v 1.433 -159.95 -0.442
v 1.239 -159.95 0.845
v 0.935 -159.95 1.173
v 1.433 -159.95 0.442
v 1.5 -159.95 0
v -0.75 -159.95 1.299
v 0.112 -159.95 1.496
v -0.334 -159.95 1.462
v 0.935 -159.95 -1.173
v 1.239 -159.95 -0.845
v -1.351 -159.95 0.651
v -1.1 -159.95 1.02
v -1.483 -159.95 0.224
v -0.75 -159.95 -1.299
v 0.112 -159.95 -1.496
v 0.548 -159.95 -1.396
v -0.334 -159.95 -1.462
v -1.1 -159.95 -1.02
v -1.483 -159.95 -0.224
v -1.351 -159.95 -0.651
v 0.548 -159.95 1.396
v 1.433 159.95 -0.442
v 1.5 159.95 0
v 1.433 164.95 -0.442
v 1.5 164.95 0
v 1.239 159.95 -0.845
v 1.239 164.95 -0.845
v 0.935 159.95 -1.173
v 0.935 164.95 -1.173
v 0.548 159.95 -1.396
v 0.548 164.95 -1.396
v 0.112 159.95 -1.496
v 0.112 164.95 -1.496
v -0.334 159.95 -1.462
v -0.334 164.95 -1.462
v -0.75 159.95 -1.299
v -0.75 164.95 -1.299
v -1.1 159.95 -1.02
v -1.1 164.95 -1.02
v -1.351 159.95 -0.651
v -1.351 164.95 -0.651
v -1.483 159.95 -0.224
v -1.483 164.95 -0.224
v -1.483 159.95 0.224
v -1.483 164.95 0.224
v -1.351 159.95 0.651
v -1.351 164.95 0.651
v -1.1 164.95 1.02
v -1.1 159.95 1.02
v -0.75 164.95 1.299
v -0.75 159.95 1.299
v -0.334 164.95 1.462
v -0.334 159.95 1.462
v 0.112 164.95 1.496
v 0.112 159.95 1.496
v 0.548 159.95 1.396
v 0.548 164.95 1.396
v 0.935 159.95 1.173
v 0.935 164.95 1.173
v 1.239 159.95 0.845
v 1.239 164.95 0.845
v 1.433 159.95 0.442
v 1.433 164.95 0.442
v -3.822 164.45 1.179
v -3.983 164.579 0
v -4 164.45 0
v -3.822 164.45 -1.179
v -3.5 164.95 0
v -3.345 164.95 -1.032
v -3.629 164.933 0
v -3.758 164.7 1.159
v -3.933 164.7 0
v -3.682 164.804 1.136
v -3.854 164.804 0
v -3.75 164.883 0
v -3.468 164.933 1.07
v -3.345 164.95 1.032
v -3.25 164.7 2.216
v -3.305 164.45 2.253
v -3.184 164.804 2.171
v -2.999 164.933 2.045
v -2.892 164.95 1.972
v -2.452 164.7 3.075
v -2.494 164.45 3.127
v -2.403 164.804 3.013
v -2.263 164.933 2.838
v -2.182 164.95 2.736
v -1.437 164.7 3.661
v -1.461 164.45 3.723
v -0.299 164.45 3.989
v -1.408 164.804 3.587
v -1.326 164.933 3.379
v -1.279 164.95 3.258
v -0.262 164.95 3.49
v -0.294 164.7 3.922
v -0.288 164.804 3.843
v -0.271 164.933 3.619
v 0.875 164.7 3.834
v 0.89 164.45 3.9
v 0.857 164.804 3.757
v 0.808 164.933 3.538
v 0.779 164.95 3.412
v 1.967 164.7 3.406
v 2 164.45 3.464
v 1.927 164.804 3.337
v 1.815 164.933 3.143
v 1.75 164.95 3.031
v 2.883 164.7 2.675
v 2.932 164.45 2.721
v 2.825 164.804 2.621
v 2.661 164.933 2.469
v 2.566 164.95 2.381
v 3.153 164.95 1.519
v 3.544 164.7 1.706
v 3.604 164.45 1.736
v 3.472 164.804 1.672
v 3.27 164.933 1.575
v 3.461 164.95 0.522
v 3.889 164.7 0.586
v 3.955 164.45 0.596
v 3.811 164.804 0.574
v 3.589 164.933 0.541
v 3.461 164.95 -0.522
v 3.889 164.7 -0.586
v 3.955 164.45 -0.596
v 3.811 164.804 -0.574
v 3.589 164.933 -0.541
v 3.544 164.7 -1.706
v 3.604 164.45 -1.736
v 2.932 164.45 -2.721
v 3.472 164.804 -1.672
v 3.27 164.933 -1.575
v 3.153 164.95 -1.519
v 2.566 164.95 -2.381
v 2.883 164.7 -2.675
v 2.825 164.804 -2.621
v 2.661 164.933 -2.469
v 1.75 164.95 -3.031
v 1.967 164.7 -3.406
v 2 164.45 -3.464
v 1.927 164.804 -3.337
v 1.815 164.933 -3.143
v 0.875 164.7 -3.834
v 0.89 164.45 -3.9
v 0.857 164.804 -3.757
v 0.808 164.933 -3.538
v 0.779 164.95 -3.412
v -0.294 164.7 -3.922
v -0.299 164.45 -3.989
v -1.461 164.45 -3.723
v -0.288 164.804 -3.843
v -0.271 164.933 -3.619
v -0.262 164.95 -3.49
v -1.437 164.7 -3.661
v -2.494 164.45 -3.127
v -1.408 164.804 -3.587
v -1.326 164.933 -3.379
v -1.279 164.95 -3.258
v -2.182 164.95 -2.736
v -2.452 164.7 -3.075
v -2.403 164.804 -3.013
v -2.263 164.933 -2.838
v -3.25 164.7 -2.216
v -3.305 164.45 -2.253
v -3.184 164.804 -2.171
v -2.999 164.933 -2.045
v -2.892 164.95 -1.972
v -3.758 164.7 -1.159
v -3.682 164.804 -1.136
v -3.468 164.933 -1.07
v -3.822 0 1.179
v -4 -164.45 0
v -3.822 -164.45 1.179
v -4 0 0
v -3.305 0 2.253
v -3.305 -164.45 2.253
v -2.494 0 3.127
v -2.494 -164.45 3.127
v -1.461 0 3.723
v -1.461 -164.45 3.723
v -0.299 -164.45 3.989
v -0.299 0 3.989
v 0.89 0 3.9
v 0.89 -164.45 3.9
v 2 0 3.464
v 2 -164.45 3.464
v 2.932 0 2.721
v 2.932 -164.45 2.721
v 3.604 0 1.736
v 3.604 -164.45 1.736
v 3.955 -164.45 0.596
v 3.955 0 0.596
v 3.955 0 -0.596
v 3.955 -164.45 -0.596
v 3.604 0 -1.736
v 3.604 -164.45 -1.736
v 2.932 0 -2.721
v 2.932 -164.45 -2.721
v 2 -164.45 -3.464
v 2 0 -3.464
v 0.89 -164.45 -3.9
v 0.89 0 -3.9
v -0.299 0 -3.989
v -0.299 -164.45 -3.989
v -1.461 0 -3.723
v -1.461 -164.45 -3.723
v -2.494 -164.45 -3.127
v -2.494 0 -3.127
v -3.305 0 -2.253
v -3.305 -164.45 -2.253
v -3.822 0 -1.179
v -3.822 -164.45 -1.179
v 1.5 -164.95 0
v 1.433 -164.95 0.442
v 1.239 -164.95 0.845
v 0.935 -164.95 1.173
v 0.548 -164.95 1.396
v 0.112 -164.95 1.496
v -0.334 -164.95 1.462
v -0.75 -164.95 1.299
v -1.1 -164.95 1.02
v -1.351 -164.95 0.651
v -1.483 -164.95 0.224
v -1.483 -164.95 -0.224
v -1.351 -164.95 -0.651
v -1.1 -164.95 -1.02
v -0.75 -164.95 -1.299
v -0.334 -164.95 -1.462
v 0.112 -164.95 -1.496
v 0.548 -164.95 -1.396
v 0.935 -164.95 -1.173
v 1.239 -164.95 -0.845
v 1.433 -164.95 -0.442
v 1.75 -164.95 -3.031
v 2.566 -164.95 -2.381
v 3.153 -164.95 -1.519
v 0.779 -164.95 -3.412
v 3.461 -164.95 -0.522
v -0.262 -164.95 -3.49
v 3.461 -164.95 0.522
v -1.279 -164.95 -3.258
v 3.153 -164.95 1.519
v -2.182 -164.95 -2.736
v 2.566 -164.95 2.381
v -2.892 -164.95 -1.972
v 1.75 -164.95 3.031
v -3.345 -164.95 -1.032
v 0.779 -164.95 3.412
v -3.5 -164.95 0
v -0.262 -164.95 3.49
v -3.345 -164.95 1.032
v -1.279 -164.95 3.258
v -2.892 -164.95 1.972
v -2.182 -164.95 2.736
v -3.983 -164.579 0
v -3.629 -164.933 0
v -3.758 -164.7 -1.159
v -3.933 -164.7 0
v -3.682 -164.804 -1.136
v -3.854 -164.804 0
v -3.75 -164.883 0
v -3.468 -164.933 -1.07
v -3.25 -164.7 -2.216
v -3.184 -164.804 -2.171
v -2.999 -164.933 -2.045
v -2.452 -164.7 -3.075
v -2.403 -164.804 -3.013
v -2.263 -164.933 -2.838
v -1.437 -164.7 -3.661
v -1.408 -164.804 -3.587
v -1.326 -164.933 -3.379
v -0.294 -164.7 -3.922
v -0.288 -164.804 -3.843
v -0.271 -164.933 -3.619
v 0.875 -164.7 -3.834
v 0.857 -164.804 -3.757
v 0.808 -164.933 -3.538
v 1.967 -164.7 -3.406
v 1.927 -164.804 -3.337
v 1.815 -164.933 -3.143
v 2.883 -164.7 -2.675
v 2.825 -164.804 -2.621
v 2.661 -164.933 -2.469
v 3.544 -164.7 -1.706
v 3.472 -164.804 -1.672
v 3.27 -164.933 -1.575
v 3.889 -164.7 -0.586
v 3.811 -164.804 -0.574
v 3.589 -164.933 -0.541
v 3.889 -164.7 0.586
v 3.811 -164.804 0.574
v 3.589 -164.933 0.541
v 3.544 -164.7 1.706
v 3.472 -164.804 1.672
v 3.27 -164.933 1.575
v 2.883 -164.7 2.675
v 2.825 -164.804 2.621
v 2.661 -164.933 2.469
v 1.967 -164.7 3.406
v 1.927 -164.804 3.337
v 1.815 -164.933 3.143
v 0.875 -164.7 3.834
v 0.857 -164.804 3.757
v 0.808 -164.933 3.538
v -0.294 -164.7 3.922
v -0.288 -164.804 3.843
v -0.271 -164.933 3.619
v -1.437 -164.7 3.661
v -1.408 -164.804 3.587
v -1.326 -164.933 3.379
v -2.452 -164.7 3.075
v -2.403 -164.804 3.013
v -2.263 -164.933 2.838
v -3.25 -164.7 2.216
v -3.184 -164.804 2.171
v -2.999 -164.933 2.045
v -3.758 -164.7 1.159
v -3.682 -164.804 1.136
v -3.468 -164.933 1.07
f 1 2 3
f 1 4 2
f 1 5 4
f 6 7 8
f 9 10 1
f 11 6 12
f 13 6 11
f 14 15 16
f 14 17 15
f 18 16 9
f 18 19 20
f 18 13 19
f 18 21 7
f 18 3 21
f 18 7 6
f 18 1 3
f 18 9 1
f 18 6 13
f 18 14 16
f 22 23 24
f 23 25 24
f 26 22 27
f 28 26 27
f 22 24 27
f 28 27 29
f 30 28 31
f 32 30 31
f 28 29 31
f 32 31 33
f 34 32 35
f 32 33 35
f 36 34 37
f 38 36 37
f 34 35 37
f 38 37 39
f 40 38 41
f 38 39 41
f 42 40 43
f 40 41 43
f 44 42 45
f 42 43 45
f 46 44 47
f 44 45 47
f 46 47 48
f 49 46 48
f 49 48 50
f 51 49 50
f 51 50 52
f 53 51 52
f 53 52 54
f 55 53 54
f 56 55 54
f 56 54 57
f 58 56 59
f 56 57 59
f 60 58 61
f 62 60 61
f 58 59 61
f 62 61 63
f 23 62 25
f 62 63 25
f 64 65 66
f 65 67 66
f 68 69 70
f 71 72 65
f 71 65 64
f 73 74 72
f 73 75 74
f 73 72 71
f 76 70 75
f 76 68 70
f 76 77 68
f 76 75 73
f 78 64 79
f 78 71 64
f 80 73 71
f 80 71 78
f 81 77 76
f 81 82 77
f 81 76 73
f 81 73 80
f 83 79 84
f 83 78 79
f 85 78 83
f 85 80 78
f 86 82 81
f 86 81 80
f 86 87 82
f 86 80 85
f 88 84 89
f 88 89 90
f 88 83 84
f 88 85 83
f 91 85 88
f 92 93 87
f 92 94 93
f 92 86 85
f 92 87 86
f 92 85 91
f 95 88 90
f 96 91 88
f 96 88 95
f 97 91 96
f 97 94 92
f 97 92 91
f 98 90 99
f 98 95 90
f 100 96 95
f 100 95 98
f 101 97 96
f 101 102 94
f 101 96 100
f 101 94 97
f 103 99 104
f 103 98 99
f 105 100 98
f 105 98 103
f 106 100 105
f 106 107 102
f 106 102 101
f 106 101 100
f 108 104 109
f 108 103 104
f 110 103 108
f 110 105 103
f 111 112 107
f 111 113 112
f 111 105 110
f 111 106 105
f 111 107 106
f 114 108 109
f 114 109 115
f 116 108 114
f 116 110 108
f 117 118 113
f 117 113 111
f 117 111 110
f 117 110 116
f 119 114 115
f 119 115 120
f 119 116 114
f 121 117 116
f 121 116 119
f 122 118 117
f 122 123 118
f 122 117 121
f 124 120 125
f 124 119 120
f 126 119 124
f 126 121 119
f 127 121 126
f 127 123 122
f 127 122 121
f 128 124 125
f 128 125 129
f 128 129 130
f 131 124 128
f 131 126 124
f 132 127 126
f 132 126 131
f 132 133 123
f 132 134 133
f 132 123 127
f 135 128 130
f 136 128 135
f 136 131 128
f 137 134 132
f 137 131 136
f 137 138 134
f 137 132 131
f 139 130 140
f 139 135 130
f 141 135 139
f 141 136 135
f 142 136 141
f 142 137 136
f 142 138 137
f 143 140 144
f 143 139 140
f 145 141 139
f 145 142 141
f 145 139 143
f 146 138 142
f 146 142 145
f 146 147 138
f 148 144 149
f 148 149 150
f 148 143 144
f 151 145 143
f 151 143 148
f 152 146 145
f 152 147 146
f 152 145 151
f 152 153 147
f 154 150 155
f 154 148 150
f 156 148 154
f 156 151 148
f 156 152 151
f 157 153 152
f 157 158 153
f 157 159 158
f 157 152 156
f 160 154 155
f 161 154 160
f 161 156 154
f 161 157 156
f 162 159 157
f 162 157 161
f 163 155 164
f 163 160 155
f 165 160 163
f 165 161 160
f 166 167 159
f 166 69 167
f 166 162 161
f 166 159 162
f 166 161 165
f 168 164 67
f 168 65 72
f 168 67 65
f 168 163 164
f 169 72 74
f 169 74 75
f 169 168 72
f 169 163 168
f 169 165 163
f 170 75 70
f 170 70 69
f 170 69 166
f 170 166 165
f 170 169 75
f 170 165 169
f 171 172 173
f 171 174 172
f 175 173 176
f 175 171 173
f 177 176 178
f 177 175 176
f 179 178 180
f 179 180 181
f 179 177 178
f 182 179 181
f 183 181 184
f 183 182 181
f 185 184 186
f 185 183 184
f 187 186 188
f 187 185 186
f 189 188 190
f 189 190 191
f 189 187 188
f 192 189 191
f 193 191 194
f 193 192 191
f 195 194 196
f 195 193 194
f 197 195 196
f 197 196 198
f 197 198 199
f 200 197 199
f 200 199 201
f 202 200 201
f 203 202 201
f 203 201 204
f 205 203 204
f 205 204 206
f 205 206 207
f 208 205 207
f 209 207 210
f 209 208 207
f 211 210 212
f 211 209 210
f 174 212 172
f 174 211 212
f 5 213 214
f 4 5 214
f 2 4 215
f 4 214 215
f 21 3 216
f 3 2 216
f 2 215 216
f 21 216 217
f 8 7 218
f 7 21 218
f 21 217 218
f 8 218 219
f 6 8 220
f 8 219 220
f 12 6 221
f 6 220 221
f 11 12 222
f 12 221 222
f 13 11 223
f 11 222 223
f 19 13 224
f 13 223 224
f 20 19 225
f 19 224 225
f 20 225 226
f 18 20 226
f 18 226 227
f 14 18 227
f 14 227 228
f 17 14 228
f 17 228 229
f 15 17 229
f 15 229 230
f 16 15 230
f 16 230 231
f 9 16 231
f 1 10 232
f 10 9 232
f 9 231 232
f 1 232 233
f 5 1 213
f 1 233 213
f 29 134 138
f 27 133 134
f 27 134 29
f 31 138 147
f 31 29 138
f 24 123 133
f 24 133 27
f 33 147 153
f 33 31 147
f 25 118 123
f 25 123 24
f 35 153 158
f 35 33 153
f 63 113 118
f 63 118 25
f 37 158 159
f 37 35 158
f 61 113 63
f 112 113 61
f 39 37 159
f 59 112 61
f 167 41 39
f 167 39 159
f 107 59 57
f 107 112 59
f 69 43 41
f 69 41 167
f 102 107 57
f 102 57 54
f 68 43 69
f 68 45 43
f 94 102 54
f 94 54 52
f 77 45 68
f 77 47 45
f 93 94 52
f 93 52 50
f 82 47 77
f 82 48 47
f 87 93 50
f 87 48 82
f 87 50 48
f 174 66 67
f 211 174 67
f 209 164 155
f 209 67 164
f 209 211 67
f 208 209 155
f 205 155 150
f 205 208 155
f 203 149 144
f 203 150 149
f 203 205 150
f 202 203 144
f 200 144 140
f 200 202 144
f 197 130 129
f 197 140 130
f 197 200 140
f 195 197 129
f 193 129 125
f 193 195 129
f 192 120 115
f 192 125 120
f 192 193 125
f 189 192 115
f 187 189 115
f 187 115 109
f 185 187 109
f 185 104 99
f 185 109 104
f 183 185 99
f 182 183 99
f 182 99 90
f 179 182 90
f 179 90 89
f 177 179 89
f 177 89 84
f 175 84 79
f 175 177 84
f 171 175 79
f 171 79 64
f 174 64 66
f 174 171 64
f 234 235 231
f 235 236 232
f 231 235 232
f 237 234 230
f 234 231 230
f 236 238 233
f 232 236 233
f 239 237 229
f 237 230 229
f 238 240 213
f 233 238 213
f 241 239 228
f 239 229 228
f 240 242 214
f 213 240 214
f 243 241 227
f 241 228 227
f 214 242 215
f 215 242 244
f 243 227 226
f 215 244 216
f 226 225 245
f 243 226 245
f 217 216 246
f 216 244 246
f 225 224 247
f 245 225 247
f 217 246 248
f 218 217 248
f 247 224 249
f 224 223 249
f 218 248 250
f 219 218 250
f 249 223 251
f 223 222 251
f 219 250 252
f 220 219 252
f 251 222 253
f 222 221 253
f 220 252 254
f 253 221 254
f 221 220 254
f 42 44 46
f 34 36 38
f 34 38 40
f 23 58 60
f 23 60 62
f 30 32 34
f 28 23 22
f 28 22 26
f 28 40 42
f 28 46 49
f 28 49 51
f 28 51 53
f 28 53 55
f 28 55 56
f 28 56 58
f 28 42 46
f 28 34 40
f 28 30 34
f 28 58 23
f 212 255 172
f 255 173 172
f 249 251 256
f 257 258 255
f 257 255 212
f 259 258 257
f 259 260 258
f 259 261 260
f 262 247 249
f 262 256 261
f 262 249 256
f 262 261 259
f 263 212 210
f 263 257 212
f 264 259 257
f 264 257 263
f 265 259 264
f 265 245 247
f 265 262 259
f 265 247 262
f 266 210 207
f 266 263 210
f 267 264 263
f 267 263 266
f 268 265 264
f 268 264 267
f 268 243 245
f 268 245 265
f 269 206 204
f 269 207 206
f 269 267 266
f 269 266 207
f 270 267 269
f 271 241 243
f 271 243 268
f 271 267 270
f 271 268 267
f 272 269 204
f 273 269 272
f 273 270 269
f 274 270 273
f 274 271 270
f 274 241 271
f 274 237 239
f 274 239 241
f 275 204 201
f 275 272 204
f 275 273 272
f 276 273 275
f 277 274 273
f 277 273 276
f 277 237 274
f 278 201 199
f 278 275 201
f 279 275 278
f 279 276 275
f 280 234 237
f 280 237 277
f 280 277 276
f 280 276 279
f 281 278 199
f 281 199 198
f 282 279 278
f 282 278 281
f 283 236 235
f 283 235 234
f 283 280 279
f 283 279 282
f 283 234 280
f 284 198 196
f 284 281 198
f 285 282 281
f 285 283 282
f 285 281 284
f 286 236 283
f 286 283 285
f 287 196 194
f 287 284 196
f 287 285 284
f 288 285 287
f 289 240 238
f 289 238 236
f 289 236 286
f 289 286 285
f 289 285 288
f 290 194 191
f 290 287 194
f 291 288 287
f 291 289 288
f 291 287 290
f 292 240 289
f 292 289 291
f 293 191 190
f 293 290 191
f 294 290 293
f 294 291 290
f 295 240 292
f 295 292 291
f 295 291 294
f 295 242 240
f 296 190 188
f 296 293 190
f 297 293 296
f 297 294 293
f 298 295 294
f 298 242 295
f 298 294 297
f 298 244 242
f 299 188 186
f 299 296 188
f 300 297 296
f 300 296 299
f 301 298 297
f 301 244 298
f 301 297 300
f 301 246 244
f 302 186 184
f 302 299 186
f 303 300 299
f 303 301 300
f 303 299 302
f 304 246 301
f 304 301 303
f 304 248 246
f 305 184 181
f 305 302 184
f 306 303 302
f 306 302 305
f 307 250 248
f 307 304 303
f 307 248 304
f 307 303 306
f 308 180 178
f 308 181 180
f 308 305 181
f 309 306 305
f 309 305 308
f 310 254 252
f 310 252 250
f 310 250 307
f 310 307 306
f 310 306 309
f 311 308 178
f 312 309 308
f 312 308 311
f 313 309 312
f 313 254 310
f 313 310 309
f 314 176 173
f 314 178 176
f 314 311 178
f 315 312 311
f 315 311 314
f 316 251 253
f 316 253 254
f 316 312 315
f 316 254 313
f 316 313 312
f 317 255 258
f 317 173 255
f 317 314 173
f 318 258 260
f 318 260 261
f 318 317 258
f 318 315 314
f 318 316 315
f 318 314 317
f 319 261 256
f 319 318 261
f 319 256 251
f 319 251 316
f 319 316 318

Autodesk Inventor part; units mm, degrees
ref_plane "YZ Plane" through (0, 0, 0) normal (1, 0, 0) x (0, 1, 0)
ref_plane "XZ Plane" through (0, 0, 0) normal (0, 1, 0) x (-1, 0, 0)
ref_plane "XY Plane" through (0, 0, 0) normal (0, 0, 1) x (1, 0, 0)
sketch "Эскиз1" plane through (0, 0, 0) normal (0, 1, 0) x (-1, 0, 0)
  circle A0 centre (0, 0) radius 4
  dimension "d0" = 8
extrude "Выдавливание1" add sketch "Эскиз1" along normal mid plane 329.9
sketch "Эскиз2" plane through (0, 164.95, 0) normal (0, 1, 0) x (1, 0, 0)
  circle A0 centre (0, 0) radius 1.5
  dimension "d3" = 3
extrude "Выдавливание2" cut sketch "Эскиз2" against normal blind 5
mirror "Зеркальное отражение1" about plane through (0, 0, 0) normal (0, 1, 0) of "Выдавливание2"
fillet "Сопряжение1" radius 0.5 2 edges at (4, -164.95, 0) (4, 164.95, 0)
properties part number "вал 8мм"
